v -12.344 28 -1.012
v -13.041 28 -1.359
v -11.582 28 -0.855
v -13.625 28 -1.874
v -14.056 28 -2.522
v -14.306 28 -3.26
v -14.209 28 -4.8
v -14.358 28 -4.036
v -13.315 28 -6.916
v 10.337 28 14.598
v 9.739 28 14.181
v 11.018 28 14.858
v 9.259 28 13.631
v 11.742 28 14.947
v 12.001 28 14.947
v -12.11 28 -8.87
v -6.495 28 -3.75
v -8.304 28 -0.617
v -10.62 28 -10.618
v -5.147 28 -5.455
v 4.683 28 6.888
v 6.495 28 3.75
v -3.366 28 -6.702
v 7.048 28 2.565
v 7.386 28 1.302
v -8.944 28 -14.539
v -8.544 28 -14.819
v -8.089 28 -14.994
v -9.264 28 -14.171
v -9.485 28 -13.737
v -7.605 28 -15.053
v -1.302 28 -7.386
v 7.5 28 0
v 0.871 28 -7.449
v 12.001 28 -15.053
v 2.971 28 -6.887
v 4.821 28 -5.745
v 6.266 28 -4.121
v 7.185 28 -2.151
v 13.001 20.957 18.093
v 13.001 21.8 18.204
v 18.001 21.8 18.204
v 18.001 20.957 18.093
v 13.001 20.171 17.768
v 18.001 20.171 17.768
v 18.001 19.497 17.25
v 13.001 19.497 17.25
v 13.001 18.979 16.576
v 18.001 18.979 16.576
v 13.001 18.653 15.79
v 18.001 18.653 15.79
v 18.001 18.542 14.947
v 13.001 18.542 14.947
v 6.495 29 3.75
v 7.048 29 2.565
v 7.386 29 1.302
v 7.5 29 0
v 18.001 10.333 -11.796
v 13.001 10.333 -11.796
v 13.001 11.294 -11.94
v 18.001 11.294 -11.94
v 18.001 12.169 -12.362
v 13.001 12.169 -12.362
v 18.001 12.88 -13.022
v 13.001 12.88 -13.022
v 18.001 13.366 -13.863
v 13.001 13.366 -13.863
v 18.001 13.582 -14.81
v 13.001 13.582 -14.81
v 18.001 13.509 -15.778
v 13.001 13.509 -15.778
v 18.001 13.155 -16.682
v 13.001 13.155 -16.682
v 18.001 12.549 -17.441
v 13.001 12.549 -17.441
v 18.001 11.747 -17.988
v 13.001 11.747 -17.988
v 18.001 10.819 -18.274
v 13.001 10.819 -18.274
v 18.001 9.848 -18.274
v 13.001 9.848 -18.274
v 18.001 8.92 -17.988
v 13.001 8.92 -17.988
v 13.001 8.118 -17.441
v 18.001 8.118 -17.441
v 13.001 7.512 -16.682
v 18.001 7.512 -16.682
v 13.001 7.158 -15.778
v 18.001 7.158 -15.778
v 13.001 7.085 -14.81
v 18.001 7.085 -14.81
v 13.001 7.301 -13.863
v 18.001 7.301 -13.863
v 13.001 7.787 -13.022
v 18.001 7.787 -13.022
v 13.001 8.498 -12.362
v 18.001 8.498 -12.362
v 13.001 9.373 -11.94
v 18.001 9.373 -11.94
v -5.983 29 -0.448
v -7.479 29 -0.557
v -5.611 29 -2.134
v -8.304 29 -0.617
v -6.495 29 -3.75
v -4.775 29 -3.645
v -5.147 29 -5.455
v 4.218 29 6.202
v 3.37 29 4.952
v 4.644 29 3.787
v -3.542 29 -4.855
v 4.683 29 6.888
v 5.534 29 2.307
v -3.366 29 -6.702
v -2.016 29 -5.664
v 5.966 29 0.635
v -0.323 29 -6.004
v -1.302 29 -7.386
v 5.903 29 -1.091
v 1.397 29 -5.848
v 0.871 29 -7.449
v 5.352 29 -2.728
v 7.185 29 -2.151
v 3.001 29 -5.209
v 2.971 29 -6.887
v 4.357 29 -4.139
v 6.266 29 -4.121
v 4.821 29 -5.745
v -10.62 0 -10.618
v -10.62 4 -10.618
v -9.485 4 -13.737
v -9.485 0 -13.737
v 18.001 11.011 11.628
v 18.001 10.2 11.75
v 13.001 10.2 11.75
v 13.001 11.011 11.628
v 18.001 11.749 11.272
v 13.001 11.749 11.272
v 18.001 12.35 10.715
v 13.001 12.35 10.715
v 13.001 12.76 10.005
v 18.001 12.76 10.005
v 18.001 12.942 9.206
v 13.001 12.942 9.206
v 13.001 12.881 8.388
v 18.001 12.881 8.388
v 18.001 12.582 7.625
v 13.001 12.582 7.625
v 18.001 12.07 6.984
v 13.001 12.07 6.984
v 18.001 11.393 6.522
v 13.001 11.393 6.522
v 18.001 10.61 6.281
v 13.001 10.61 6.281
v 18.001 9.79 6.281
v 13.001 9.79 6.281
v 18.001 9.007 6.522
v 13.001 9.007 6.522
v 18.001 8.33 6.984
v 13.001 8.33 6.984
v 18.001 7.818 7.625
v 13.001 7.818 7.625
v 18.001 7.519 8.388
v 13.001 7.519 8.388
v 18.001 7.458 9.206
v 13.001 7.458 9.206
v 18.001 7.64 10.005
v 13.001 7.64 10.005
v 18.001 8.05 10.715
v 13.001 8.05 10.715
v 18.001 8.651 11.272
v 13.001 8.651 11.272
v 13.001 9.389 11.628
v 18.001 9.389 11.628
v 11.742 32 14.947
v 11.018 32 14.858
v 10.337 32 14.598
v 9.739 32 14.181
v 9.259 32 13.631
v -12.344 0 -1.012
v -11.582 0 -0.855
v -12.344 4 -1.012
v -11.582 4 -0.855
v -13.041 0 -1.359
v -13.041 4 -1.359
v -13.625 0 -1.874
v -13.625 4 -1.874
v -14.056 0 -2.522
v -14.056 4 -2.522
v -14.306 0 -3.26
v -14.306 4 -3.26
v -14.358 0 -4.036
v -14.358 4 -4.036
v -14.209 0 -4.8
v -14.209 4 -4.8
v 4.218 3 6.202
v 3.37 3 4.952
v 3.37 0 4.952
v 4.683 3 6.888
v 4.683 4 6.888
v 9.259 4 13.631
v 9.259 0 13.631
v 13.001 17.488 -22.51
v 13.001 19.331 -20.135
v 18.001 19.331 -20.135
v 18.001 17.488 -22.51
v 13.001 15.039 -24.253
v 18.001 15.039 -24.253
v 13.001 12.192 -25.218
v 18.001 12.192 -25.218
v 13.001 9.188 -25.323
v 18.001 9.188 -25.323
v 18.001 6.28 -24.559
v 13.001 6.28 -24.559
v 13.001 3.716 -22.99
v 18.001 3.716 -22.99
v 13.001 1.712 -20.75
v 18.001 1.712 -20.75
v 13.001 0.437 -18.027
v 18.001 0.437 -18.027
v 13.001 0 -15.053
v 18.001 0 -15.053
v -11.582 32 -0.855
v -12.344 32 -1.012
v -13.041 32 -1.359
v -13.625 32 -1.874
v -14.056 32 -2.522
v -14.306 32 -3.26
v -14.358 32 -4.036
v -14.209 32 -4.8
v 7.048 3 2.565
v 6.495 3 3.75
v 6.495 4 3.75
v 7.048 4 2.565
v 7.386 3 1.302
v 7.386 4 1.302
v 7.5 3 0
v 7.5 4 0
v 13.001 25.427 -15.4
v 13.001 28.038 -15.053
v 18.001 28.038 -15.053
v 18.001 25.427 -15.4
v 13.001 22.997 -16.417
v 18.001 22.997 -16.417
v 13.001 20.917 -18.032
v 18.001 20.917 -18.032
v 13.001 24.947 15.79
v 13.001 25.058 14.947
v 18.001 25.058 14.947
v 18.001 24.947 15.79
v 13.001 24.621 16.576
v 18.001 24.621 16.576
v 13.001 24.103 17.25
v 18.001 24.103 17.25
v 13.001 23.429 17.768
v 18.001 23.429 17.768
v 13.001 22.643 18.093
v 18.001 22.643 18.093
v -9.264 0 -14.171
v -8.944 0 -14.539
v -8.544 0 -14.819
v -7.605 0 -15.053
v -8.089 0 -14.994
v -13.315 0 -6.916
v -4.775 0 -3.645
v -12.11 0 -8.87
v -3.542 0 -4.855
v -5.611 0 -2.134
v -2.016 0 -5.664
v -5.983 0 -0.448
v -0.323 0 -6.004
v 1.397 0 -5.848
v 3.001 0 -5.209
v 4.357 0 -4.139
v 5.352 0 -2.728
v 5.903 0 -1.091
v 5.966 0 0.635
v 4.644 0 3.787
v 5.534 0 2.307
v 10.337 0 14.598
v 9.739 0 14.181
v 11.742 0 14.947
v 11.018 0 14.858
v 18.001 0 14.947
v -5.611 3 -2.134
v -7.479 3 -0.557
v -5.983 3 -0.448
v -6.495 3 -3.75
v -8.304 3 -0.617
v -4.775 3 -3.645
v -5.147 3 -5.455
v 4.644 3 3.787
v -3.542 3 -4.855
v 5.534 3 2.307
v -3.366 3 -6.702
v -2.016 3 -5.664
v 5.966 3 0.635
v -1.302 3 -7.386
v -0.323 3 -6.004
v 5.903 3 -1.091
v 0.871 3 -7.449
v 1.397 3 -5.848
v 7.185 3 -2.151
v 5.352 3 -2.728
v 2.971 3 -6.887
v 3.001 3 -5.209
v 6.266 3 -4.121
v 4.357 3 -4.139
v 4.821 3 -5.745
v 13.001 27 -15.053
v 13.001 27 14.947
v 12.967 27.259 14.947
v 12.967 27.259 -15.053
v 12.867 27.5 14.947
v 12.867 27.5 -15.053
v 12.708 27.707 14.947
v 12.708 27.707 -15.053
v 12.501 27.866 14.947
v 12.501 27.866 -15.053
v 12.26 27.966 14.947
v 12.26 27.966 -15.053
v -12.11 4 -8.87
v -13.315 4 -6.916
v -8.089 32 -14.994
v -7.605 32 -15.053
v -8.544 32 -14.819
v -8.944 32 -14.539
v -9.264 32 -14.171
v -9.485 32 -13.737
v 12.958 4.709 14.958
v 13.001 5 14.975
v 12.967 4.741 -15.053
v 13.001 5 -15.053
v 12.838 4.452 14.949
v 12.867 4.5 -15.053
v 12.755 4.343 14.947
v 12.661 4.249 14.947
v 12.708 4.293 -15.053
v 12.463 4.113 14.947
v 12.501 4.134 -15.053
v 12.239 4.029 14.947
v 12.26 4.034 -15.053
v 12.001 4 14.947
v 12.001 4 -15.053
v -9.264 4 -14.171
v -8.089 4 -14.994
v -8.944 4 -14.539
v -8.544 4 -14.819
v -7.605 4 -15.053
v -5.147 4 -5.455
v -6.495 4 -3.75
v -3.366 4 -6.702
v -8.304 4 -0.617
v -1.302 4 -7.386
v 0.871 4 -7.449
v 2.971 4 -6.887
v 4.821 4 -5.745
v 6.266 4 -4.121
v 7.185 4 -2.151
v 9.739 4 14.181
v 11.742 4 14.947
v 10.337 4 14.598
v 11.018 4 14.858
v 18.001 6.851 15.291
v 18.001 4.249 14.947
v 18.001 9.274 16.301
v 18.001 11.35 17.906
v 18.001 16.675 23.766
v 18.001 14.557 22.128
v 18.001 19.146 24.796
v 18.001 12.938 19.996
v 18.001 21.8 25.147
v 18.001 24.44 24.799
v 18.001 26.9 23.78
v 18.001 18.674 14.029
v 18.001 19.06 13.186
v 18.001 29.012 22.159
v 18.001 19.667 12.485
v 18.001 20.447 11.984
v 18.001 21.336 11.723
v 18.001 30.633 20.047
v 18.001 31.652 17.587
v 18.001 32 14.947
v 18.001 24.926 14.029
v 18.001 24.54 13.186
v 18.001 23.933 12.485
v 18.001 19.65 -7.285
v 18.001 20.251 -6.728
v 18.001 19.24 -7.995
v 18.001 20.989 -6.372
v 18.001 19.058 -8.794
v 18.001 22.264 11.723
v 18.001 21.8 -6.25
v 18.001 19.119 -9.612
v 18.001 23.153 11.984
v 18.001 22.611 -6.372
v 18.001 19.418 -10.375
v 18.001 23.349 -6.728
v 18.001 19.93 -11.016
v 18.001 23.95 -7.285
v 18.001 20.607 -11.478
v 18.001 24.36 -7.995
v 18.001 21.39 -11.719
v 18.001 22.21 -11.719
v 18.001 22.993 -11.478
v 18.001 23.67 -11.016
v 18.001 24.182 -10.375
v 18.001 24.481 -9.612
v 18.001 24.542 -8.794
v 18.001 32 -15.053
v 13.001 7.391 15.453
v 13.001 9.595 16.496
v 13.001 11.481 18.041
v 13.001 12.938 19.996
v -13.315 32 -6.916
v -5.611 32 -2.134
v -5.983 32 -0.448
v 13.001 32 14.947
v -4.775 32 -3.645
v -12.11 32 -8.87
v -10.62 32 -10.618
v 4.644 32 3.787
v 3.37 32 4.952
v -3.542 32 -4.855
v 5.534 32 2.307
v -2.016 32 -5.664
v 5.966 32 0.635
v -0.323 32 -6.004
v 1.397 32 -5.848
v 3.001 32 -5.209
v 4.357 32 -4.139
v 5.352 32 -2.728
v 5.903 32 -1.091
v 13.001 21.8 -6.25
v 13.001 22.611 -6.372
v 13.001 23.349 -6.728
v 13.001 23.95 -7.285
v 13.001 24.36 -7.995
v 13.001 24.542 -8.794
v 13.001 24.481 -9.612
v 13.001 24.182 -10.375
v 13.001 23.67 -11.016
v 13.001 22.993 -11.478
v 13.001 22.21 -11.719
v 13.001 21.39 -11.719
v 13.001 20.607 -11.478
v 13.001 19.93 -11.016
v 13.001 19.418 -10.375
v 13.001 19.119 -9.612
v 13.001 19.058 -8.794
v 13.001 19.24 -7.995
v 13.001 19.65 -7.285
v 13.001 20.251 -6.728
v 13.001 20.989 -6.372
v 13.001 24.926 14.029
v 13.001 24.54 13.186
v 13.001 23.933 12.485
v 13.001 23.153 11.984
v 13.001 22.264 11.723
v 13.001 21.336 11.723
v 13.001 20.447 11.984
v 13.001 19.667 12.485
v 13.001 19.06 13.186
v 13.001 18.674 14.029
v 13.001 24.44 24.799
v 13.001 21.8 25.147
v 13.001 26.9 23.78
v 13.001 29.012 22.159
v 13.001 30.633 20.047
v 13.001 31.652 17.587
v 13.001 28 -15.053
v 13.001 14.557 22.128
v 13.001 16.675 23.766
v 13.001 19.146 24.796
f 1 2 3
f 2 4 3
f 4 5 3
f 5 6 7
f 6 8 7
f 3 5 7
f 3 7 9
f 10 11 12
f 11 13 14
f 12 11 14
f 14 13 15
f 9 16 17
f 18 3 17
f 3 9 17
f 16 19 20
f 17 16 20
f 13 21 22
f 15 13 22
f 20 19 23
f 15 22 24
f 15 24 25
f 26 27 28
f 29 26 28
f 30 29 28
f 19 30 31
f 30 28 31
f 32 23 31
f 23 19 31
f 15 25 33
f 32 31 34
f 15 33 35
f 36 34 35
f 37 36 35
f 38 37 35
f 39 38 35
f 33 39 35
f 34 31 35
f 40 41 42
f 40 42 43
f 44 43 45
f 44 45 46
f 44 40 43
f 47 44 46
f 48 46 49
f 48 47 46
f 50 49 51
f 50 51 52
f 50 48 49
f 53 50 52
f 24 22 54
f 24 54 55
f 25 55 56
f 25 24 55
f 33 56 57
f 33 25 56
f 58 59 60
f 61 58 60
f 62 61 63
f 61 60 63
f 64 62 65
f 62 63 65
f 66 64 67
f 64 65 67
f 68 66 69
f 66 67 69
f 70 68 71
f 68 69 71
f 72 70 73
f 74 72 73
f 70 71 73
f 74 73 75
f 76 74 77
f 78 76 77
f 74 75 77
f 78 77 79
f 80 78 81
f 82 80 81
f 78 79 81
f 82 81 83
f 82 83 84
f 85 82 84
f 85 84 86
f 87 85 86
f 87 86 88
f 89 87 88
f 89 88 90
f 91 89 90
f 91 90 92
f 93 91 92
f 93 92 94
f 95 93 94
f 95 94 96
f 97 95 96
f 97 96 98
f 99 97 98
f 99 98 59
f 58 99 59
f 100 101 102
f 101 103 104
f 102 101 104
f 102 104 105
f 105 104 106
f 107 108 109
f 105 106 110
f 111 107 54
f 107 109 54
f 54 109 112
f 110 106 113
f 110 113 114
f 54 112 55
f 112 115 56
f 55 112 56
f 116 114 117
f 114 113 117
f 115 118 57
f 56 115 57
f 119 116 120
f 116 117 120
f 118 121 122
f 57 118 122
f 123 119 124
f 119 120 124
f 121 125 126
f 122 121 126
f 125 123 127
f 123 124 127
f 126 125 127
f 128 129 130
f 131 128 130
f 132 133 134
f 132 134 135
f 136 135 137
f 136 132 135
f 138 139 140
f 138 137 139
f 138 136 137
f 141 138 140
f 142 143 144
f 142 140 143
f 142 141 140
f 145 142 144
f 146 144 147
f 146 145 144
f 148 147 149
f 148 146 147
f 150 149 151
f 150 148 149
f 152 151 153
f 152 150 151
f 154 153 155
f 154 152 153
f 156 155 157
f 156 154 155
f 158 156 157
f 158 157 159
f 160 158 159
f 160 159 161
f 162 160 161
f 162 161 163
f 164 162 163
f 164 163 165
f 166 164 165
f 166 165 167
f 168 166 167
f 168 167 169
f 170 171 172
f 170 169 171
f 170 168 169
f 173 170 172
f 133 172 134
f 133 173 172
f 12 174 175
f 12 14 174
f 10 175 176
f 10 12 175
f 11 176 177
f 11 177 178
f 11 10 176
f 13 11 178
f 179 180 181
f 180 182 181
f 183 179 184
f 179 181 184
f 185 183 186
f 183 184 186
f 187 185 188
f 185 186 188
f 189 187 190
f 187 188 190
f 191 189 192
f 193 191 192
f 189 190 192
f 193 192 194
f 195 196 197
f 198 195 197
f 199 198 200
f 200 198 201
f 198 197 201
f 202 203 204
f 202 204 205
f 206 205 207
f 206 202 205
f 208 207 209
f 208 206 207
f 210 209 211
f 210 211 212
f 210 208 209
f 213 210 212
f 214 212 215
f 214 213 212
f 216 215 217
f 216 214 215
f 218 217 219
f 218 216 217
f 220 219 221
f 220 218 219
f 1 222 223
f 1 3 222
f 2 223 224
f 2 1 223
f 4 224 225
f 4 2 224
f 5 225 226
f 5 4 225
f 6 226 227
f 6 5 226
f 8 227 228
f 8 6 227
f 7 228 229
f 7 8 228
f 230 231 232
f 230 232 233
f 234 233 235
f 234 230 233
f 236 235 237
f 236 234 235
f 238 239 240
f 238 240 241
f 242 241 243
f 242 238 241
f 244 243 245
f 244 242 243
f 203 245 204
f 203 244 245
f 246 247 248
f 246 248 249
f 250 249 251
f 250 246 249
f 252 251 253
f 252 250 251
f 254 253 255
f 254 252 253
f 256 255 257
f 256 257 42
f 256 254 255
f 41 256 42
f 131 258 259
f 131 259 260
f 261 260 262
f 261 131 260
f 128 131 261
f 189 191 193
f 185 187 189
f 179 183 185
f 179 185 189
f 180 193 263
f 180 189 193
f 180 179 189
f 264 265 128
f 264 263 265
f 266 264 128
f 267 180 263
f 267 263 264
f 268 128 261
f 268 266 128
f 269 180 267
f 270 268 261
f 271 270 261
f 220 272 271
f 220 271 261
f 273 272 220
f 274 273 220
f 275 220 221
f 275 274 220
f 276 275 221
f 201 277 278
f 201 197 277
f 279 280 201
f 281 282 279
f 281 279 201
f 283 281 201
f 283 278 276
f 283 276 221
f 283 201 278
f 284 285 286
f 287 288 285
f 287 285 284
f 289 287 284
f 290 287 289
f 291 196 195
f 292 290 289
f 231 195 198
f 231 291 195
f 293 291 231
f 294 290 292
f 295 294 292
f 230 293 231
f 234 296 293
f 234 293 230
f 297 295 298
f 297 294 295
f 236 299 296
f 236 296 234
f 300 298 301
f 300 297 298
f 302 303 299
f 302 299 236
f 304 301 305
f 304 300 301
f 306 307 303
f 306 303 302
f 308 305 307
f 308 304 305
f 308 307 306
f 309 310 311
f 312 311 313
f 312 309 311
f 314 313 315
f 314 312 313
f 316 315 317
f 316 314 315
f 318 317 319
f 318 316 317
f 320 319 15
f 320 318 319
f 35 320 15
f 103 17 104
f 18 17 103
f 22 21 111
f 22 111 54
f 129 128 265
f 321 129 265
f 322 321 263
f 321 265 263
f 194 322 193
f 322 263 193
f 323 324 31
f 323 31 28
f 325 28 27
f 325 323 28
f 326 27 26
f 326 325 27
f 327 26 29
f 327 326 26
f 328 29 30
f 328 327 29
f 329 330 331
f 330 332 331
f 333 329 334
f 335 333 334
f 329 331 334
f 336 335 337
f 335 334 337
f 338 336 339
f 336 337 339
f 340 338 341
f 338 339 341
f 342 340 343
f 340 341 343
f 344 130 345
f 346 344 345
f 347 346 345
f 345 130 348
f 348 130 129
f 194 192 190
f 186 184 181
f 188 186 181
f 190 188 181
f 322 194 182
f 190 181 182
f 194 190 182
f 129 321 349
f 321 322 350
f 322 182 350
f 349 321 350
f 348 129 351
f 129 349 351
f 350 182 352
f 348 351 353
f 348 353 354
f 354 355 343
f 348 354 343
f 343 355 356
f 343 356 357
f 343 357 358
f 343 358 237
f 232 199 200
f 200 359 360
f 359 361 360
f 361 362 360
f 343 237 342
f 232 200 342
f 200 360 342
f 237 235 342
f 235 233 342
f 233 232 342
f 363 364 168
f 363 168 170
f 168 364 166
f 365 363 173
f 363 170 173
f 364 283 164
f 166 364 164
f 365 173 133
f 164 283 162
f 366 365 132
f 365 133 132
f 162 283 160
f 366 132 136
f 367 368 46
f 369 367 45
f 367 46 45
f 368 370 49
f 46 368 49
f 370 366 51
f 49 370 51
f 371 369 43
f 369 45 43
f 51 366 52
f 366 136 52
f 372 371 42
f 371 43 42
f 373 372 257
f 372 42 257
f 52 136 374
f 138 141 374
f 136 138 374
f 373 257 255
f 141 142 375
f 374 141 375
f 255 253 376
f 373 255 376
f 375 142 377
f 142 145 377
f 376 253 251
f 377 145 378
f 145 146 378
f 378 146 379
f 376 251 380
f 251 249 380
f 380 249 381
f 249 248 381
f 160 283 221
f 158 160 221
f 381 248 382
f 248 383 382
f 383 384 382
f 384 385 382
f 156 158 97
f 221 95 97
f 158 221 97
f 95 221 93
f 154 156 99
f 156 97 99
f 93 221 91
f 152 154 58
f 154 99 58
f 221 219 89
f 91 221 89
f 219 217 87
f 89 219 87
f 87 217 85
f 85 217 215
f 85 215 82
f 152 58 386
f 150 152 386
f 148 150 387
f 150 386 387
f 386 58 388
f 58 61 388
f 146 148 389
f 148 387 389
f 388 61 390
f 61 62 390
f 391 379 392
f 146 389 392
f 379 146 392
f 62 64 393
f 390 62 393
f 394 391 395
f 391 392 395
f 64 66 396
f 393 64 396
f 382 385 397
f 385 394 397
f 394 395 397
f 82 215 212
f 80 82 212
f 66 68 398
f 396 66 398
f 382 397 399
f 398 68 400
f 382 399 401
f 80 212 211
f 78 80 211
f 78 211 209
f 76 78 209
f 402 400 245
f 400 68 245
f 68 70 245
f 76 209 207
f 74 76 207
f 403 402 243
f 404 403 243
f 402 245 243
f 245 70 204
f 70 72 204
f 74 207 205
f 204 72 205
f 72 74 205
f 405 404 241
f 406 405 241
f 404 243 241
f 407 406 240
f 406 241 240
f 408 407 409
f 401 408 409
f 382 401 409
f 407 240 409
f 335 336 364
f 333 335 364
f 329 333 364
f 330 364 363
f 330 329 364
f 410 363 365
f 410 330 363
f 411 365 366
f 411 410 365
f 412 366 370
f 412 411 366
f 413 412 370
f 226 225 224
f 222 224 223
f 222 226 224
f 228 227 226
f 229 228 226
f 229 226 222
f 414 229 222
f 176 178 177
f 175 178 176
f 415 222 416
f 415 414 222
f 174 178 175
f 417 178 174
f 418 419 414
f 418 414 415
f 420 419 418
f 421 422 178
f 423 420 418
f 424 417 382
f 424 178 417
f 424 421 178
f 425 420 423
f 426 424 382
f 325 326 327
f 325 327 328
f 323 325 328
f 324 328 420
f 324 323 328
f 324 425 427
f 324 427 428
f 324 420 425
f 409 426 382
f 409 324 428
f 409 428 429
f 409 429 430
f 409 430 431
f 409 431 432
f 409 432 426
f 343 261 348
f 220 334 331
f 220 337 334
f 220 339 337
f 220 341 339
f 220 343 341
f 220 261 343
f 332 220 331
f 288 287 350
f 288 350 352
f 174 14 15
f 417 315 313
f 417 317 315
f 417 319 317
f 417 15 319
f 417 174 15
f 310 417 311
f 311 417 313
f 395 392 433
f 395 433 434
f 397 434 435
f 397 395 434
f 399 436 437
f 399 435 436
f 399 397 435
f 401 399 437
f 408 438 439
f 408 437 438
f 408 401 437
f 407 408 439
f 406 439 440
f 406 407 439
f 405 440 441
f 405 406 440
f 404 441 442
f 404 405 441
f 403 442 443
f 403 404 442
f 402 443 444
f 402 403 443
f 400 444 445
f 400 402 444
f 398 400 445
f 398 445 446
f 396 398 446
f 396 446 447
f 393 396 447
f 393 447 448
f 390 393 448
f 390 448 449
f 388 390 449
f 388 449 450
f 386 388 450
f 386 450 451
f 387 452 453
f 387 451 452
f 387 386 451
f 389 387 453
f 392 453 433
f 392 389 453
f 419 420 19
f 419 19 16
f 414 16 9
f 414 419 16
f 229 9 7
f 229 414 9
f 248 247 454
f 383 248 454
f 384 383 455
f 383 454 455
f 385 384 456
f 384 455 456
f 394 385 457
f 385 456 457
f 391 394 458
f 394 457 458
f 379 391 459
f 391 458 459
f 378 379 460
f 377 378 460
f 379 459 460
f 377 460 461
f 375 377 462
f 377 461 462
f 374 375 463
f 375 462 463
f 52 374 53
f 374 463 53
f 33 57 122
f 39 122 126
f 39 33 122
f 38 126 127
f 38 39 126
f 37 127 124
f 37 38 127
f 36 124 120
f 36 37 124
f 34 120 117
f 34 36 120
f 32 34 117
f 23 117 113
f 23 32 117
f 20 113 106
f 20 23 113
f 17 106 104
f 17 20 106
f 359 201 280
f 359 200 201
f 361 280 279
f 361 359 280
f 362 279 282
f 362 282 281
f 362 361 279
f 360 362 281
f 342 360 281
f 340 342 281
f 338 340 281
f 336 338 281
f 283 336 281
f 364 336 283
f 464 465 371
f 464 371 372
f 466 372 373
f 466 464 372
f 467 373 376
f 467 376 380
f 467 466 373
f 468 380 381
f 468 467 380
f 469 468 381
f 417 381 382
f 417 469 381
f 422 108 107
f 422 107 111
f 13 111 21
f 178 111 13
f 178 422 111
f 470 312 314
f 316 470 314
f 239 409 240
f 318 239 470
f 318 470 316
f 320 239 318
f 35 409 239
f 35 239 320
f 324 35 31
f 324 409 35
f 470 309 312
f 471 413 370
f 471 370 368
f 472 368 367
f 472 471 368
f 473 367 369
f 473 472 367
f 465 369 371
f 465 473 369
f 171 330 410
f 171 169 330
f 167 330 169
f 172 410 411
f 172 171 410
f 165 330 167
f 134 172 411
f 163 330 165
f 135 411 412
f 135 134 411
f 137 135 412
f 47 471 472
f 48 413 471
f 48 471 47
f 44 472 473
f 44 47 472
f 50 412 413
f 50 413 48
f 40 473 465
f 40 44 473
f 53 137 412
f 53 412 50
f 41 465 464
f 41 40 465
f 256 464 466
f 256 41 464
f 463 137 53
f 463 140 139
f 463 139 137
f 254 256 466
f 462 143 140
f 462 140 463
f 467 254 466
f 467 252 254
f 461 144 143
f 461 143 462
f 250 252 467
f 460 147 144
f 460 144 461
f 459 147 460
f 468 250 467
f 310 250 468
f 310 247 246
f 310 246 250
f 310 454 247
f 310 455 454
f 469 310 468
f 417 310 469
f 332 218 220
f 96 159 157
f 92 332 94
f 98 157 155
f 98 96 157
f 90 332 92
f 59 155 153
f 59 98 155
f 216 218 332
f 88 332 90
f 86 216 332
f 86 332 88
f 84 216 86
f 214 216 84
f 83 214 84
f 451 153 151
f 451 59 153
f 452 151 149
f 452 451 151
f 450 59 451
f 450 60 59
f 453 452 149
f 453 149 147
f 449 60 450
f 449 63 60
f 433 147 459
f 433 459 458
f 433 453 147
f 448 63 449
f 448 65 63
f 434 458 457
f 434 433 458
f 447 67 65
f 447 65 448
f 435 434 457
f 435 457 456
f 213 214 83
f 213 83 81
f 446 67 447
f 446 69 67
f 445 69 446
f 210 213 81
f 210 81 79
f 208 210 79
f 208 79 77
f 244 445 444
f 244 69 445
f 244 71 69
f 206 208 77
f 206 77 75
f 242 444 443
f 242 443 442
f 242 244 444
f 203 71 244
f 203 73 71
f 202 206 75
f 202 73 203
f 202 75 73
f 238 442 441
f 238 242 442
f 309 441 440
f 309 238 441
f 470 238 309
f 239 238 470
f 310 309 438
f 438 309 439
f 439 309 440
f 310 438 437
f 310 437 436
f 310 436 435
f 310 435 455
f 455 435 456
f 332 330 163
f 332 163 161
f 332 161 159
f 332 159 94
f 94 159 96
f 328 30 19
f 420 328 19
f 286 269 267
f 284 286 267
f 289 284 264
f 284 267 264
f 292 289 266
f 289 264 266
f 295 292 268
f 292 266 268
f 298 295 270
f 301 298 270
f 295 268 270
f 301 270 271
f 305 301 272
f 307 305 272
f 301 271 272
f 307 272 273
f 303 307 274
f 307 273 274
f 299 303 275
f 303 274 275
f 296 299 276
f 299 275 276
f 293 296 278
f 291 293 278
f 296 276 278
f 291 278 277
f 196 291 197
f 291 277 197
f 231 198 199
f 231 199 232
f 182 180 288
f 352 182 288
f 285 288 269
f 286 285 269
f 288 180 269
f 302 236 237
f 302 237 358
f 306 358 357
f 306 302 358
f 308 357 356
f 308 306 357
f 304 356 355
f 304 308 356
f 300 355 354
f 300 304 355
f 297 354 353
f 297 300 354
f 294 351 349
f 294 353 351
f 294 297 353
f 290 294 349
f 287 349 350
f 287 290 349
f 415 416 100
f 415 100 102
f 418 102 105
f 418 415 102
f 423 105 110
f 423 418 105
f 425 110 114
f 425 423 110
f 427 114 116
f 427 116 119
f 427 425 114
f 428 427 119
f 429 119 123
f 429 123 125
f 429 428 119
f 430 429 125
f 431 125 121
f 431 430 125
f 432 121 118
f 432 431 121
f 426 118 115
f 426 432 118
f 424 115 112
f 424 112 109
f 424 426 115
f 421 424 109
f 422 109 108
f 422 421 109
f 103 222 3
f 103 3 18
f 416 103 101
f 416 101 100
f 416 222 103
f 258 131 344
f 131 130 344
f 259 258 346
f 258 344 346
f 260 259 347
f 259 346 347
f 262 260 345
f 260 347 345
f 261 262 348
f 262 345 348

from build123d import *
from build123d.topology import SkipClean

# Parameters (mm, degrees)
BOSS_EXTRUDE1_DEPTH     = 4
SKETCH3_W               = 5
SKETCH3_H               = 30
BOSS_EXTRUDE3_DEPTH     = 24
BOSS_EXTRUDE5_DEPTH     = 5
SKETCH7_3_R             = 3.25755
CUT_EXTRUDE3_DEPTH      = 5
FILLET3_R               = 10
CUT_EXTRUDE4_DEPTH      = 25
CUT_EXTRUDE4_DEPTH_BACK = 1
CUT_EXTRUDE5_DEPTH      = 50.494221145
CUT_EXTRUDE5_DEPTH_BACK = 50.494221145
SKETCH9_R               = 2.75
FILLET4_R               = 1
FILLET5_R               = 3
BOSS_EXTRUDE6_DEPTH     = 4
FILLET6_R               = 2
BOSS_EXTRUDE7_DEPTH     = 4


with BuildPart() as part:
    # Sketch2 → Boss-Extrude1 (new body)
    with BuildSketch(Plane(origin=(0, 0, 0), x_dir=(1, 0, 0), z_dir=(0, 1, 0))):
        with BuildLine():
            Line((18.000912404, -14.946929254), (18.000912404, 15.053070746))
            Line((18.000912404, 15.053070746), (0.039090451, 15.053070746))
            ThreePointArc((0.039090451, 15.053070746), (-10.199781301, 11.024824414), (-14.94907539, 1.099832277))
            Line((-14.94907539, 1.099832277), (-5.983249792, 0.448020006))
            ThreePointArc((-5.983249792, 0.448020006), (3.000957071, 5.20912276), (3.369824569, -4.951979994))
            Line((3.369824569, -4.951979994), (10.151696986, -14.946929254))
            Line((10.151696986, -14.946929254), (18.000912404, -14.946929254))
        make_face()
    boss_extrude1 = extrude(amount=BOSS_EXTRUDE1_DEPTH)

    # Sketch3 → Boss-Extrude3 (add)
    with BuildSketch(Plane(origin=(0, 4, 0), x_dir=(1, 0, 0), z_dir=(0, 1, 0))):
        with Locations((15.500912404, 0.053070746)):
            Rectangle(SKETCH3_W, SKETCH3_H)
    extrude(amount=BOSS_EXTRUDE3_DEPTH)

    # Mirror1: Boss-Extrude1 across plane
    add(boss_extrude1.mirror(Plane.ZX.offset(16)))

    # Sketch7 → Boss-Extrude5 (add)
    with BuildSketch(Plane.ZY.offset(-13.000912404)):
        with BuildLine():
            Line((-15.053070746, 0), (-15.053070746, 4))
            Line((-15.053070746, 4), (-15.053070746, 7.075913265))
            ThreePointArc((-15.053070746, 7.075913265), (-18.310620746, 10.333463265), (-15.053070746, 13.591013265))
            Line((-15.053070746, 13.591013265), (-15.053070746, 20.666926531))
            ThreePointArc((-15.053070746, 20.666926531), (-25.386534011, 10.333463265), (-15.053070746, 0))
        make_face()
        with BuildLine():
            ThreePointArc((25.146929254, 21.8), (22.159418422, 29.012489168), (14.946929254, 32))
            Line((14.946929254, 32), (14.946929254, 28))
            Line((14.946929254, 28), (14.946929254, 25.05755))
            ThreePointArc((14.946929254, 25.05755), (17.250364949, 24.103435695), (18.204479254, 21.8))
            ThreePointArc((18.204479254, 21.8), (17.250364949, 19.496564305), (14.946929254, 18.54245))
            Line((14.946929254, 18.54245), (14.946929254, 11.6))
            ThreePointArc((14.946929254, 11.6), (22.159418422, 14.587510832), (25.146929254, 21.8))
        make_face()
        with BuildLine():
            Line((14.946929254, 28), (14.946929254, 32))
            ThreePointArc((14.946929254, 32), (4.746929254, 21.8), (14.946929254, 11.6))
            Line((14.946929254, 11.6), (14.946929254, 18.54245))
            ThreePointArc((14.946929254, 18.54245), (11.689379254, 21.8), (14.946929254, 25.05755))
            Line((14.946929254, 25.05755), (14.946929254, 28))
        make_face()
    extrude(amount=-BOSS_EXTRUDE5_DEPTH)

    # Sketch7<3> → Cut-Extrude3 (cut)
    with SkipClean():  # the faces are left unmerged after this step: merging them gives an invalid solid
        with BuildSketch(Plane.ZY.offset(-13.000912404)):
            with Locations((14.946929254, 21.8)):
                Circle(SKETCH7_3_R)
            with Locations((-15.053070746, 10.333463265)):
                Circle(SKETCH7_3_R)
        extrude(amount=-CUT_EXTRUDE3_DEPTH, mode=Mode.SUBTRACT)

    # Fillet3
    # the kernel refuses this fillet: 10 mm, written as the material it adds along each edge
    with BuildSketch(Plane(origin=(13.000912404, 20.666926531, -15.053070746), x_dir=(0, -0.25425566101904284, -0.9671370424297528), z_dir=(1, 0, 0))) as fillet3_piece_1:
        with BuildLine():
            CenterArc((7.797239676, 9.671370424), FILLET3_R, 194.729484057, 60.541031886)
            Line((-1.874130748, 7.128813814), (0, 0))
            ThreePointArc((0, 0), (2.627341533, 0.339588165), (5.254683066, 0))
        make_face()
    extrude(amount=5)
    with BuildSketch(Plane(origin=(13.000912404, 11.6, 14.946929254), x_dir=(0, -1, 0), z_dir=(1, 0, 0))) as fillet3_piece_2:
        with BuildLine():
            CenterArc((7.351068344, -10), FILLET3_R, 90, 60.326985198)
            ThreePointArc((-1.337579351, -5.04950495), (-0.340063626, -2.611829759), (0, 0))
            Line((0, 0), (7.351068344, 0))
        make_face()
    extrude(amount=5)

    # Sketch8 → Cut-Extrude4 (cut, two sides: drawn at the far end of the back side and taken through both)
    with SkipClean():  # the faces are left unmerged after this step: merging them gives an invalid solid
        with BuildSketch(Plane(origin=(0, 4, 0), x_dir=(1, 0, 0), z_dir=(0, 1, 0)).offset(-CUT_EXTRUDE4_DEPTH_BACK)):
            with BuildLine():
                Line((-7.47930432, 0.556782628), (-5.983249792, 0.448020006))
                ThreePointArc((-5.983249792, 0.448020006), (3.000957071, 5.20912276), (3.369824569, -4.951979994))
                Line((3.369824569, -4.951979994), (4.217763535, -6.201650648))
                ThreePointArc((4.217763535, -6.201650648), (5.494951676, -5.104459431), (6.495190528, -3.75))
                ThreePointArc((6.495190528, -3.75), (7.244443697, -1.941142838), (7.5, 0))
                ThreePointArc((7.5, 0), (1.941142838, 7.244443697), (-6.495190528, 3.75))
                ThreePointArc((-6.495190528, 3.75), (-7.167341617, 2.208894325), (-7.47930432, 0.556782628))
            make_face()
            with BuildLine():
                Line((-8.304173093, 0.616750289), (-7.47930432, 0.556782628))
                ThreePointArc((-7.47930432, 0.556782628), (-7.167341617, 2.208894325), (-6.495190528, 3.75))
                Line((-6.495190528, 3.75), (-8.304173093, 0.616750289))
            make_face()
            with BuildLine():
                ThreePointArc((4.217763535, -6.201650648), (-3.752135014, -6.49395741), (-7.47930432, 0.556782628))
                Line((-7.47930432, 0.556782628), (-8.304173093, 0.616750289))
                Line((-8.304173093, 0.616750289), (-11.199802547, -4.398627047))
                Line((-11.199802547, -4.398627047), (1.534433746, -12.342282792))
                Line((1.534433746, -12.342282792), (4.683468483, -6.887994631))
                Line((4.683468483, -6.887994631), (4.217763535, -6.201650648))
            make_face()
            with BuildLine():
                ThreePointArc((6.495190528, -3.75), (5.494951676, -5.104459431), (4.217763535, -6.201650648))
                Line((4.217763535, -6.201650648), (4.683468483, -6.887994631))
                Line((4.683468483, -6.887994631), (6.495190528, -3.75))
            make_face()
            with BuildLine():
                Line((3.369824569, -4.951979994), (-5.983249792, 0.448020006))
                Line((-5.983249792, 0.448020006), (-7.47930432, 0.556782628))
                ThreePointArc((-7.47930432, 0.556782628), (-3.752135014, -6.49395741), (4.217763535, -6.201650648))
                Line((4.217763535, -6.201650648), (3.369824569, -4.951979994))
            make_face()
        extrude(amount=CUT_EXTRUDE4_DEPTH + CUT_EXTRUDE4_DEPTH_BACK, mode=Mode.SUBTRACT)

    # Sketch9 → Cut-Extrude5 (cut, two sides: drawn at the far end of the back side and taken through both)
    with BuildSketch(Plane.ZY.offset(-13.000912404).offset(-CUT_EXTRUDE5_DEPTH_BACK)):
        with Locations((9, 10.2)):
            Circle(SKETCH9_R)
        with Locations((-9, 21.8)):
            Circle(SKETCH9_R)
    extrude(amount=CUT_EXTRUDE5_DEPTH + CUT_EXTRUDE5_DEPTH_BACK, mode=Mode.SUBTRACT)

    # Fillet4
    fillet4_edges = [part.edges().sort_by_distance(p)[0] for p in [
        (13.000912404, 4, -0.053070746),
        (13.000912404, 28, -0.053070746),
    ]]
    fillet(fillet4_edges, radius=FILLET4_R)

    # Fillet5
    fillet5_edges = [part.edges().sort_by_distance(p)[0] for p in [
        (10.151696986, 2, 14.946929254),
        (-14.94907539, 2, -1.099832277),
        (10.151696986, 30, 14.946929254),
        (-14.94907539, 30, -1.099832277),
    ]]
    fillet(fillet5_edges, radius=FILLET5_R)

    # Sketch10 → Boss-Extrude6 (add)
    with BuildSketch(Plane.XZ):
        with BuildLine():
            ThreePointArc((0.039090451, -15.053070746), (-5.733491903, -13.900038334), (-10.620178824, -10.617892431))
            Line((-10.620178824, -10.617892431), (-9.005905934, -15.053070746))
            Line((-9.005905934, -15.053070746), (0.039090451, -15.053070746))
        make_face()
    extrude(amount=-BOSS_EXTRUDE6_DEPTH)

    # Fillet6
    fillet6_edges = [part.edges().sort_by_distance(p)[0] for p in [
        (-9.005905934, 2, -15.053070746),
    ]]
    fillet(fillet6_edges, radius=FILLET6_R)

    # Sketch11 → Boss-Extrude7 (add)
    with BuildSketch(Plane(origin=(0, 32, 0), x_dir=(1, 0, 0), z_dir=(0, 1, 0))):
        with BuildLine():
            Line((-9.484876099, 13.737111032), (-10.620178824, 10.617892431))
            ThreePointArc((-10.620178824, 10.617892431), (-5.733491903, 13.900038334), (0.039090451, 15.053070746))
            Line((0.039090451, 15.053070746), (-7.605490857, 15.053070746))
            ThreePointArc((-7.605490857, 15.053070746), (-8.75264373, 14.691374834), (-9.484876099, 13.737111032))
        make_face()
    extrude(amount=-BOSS_EXTRUDE7_DEPTH)


solid = part.part
